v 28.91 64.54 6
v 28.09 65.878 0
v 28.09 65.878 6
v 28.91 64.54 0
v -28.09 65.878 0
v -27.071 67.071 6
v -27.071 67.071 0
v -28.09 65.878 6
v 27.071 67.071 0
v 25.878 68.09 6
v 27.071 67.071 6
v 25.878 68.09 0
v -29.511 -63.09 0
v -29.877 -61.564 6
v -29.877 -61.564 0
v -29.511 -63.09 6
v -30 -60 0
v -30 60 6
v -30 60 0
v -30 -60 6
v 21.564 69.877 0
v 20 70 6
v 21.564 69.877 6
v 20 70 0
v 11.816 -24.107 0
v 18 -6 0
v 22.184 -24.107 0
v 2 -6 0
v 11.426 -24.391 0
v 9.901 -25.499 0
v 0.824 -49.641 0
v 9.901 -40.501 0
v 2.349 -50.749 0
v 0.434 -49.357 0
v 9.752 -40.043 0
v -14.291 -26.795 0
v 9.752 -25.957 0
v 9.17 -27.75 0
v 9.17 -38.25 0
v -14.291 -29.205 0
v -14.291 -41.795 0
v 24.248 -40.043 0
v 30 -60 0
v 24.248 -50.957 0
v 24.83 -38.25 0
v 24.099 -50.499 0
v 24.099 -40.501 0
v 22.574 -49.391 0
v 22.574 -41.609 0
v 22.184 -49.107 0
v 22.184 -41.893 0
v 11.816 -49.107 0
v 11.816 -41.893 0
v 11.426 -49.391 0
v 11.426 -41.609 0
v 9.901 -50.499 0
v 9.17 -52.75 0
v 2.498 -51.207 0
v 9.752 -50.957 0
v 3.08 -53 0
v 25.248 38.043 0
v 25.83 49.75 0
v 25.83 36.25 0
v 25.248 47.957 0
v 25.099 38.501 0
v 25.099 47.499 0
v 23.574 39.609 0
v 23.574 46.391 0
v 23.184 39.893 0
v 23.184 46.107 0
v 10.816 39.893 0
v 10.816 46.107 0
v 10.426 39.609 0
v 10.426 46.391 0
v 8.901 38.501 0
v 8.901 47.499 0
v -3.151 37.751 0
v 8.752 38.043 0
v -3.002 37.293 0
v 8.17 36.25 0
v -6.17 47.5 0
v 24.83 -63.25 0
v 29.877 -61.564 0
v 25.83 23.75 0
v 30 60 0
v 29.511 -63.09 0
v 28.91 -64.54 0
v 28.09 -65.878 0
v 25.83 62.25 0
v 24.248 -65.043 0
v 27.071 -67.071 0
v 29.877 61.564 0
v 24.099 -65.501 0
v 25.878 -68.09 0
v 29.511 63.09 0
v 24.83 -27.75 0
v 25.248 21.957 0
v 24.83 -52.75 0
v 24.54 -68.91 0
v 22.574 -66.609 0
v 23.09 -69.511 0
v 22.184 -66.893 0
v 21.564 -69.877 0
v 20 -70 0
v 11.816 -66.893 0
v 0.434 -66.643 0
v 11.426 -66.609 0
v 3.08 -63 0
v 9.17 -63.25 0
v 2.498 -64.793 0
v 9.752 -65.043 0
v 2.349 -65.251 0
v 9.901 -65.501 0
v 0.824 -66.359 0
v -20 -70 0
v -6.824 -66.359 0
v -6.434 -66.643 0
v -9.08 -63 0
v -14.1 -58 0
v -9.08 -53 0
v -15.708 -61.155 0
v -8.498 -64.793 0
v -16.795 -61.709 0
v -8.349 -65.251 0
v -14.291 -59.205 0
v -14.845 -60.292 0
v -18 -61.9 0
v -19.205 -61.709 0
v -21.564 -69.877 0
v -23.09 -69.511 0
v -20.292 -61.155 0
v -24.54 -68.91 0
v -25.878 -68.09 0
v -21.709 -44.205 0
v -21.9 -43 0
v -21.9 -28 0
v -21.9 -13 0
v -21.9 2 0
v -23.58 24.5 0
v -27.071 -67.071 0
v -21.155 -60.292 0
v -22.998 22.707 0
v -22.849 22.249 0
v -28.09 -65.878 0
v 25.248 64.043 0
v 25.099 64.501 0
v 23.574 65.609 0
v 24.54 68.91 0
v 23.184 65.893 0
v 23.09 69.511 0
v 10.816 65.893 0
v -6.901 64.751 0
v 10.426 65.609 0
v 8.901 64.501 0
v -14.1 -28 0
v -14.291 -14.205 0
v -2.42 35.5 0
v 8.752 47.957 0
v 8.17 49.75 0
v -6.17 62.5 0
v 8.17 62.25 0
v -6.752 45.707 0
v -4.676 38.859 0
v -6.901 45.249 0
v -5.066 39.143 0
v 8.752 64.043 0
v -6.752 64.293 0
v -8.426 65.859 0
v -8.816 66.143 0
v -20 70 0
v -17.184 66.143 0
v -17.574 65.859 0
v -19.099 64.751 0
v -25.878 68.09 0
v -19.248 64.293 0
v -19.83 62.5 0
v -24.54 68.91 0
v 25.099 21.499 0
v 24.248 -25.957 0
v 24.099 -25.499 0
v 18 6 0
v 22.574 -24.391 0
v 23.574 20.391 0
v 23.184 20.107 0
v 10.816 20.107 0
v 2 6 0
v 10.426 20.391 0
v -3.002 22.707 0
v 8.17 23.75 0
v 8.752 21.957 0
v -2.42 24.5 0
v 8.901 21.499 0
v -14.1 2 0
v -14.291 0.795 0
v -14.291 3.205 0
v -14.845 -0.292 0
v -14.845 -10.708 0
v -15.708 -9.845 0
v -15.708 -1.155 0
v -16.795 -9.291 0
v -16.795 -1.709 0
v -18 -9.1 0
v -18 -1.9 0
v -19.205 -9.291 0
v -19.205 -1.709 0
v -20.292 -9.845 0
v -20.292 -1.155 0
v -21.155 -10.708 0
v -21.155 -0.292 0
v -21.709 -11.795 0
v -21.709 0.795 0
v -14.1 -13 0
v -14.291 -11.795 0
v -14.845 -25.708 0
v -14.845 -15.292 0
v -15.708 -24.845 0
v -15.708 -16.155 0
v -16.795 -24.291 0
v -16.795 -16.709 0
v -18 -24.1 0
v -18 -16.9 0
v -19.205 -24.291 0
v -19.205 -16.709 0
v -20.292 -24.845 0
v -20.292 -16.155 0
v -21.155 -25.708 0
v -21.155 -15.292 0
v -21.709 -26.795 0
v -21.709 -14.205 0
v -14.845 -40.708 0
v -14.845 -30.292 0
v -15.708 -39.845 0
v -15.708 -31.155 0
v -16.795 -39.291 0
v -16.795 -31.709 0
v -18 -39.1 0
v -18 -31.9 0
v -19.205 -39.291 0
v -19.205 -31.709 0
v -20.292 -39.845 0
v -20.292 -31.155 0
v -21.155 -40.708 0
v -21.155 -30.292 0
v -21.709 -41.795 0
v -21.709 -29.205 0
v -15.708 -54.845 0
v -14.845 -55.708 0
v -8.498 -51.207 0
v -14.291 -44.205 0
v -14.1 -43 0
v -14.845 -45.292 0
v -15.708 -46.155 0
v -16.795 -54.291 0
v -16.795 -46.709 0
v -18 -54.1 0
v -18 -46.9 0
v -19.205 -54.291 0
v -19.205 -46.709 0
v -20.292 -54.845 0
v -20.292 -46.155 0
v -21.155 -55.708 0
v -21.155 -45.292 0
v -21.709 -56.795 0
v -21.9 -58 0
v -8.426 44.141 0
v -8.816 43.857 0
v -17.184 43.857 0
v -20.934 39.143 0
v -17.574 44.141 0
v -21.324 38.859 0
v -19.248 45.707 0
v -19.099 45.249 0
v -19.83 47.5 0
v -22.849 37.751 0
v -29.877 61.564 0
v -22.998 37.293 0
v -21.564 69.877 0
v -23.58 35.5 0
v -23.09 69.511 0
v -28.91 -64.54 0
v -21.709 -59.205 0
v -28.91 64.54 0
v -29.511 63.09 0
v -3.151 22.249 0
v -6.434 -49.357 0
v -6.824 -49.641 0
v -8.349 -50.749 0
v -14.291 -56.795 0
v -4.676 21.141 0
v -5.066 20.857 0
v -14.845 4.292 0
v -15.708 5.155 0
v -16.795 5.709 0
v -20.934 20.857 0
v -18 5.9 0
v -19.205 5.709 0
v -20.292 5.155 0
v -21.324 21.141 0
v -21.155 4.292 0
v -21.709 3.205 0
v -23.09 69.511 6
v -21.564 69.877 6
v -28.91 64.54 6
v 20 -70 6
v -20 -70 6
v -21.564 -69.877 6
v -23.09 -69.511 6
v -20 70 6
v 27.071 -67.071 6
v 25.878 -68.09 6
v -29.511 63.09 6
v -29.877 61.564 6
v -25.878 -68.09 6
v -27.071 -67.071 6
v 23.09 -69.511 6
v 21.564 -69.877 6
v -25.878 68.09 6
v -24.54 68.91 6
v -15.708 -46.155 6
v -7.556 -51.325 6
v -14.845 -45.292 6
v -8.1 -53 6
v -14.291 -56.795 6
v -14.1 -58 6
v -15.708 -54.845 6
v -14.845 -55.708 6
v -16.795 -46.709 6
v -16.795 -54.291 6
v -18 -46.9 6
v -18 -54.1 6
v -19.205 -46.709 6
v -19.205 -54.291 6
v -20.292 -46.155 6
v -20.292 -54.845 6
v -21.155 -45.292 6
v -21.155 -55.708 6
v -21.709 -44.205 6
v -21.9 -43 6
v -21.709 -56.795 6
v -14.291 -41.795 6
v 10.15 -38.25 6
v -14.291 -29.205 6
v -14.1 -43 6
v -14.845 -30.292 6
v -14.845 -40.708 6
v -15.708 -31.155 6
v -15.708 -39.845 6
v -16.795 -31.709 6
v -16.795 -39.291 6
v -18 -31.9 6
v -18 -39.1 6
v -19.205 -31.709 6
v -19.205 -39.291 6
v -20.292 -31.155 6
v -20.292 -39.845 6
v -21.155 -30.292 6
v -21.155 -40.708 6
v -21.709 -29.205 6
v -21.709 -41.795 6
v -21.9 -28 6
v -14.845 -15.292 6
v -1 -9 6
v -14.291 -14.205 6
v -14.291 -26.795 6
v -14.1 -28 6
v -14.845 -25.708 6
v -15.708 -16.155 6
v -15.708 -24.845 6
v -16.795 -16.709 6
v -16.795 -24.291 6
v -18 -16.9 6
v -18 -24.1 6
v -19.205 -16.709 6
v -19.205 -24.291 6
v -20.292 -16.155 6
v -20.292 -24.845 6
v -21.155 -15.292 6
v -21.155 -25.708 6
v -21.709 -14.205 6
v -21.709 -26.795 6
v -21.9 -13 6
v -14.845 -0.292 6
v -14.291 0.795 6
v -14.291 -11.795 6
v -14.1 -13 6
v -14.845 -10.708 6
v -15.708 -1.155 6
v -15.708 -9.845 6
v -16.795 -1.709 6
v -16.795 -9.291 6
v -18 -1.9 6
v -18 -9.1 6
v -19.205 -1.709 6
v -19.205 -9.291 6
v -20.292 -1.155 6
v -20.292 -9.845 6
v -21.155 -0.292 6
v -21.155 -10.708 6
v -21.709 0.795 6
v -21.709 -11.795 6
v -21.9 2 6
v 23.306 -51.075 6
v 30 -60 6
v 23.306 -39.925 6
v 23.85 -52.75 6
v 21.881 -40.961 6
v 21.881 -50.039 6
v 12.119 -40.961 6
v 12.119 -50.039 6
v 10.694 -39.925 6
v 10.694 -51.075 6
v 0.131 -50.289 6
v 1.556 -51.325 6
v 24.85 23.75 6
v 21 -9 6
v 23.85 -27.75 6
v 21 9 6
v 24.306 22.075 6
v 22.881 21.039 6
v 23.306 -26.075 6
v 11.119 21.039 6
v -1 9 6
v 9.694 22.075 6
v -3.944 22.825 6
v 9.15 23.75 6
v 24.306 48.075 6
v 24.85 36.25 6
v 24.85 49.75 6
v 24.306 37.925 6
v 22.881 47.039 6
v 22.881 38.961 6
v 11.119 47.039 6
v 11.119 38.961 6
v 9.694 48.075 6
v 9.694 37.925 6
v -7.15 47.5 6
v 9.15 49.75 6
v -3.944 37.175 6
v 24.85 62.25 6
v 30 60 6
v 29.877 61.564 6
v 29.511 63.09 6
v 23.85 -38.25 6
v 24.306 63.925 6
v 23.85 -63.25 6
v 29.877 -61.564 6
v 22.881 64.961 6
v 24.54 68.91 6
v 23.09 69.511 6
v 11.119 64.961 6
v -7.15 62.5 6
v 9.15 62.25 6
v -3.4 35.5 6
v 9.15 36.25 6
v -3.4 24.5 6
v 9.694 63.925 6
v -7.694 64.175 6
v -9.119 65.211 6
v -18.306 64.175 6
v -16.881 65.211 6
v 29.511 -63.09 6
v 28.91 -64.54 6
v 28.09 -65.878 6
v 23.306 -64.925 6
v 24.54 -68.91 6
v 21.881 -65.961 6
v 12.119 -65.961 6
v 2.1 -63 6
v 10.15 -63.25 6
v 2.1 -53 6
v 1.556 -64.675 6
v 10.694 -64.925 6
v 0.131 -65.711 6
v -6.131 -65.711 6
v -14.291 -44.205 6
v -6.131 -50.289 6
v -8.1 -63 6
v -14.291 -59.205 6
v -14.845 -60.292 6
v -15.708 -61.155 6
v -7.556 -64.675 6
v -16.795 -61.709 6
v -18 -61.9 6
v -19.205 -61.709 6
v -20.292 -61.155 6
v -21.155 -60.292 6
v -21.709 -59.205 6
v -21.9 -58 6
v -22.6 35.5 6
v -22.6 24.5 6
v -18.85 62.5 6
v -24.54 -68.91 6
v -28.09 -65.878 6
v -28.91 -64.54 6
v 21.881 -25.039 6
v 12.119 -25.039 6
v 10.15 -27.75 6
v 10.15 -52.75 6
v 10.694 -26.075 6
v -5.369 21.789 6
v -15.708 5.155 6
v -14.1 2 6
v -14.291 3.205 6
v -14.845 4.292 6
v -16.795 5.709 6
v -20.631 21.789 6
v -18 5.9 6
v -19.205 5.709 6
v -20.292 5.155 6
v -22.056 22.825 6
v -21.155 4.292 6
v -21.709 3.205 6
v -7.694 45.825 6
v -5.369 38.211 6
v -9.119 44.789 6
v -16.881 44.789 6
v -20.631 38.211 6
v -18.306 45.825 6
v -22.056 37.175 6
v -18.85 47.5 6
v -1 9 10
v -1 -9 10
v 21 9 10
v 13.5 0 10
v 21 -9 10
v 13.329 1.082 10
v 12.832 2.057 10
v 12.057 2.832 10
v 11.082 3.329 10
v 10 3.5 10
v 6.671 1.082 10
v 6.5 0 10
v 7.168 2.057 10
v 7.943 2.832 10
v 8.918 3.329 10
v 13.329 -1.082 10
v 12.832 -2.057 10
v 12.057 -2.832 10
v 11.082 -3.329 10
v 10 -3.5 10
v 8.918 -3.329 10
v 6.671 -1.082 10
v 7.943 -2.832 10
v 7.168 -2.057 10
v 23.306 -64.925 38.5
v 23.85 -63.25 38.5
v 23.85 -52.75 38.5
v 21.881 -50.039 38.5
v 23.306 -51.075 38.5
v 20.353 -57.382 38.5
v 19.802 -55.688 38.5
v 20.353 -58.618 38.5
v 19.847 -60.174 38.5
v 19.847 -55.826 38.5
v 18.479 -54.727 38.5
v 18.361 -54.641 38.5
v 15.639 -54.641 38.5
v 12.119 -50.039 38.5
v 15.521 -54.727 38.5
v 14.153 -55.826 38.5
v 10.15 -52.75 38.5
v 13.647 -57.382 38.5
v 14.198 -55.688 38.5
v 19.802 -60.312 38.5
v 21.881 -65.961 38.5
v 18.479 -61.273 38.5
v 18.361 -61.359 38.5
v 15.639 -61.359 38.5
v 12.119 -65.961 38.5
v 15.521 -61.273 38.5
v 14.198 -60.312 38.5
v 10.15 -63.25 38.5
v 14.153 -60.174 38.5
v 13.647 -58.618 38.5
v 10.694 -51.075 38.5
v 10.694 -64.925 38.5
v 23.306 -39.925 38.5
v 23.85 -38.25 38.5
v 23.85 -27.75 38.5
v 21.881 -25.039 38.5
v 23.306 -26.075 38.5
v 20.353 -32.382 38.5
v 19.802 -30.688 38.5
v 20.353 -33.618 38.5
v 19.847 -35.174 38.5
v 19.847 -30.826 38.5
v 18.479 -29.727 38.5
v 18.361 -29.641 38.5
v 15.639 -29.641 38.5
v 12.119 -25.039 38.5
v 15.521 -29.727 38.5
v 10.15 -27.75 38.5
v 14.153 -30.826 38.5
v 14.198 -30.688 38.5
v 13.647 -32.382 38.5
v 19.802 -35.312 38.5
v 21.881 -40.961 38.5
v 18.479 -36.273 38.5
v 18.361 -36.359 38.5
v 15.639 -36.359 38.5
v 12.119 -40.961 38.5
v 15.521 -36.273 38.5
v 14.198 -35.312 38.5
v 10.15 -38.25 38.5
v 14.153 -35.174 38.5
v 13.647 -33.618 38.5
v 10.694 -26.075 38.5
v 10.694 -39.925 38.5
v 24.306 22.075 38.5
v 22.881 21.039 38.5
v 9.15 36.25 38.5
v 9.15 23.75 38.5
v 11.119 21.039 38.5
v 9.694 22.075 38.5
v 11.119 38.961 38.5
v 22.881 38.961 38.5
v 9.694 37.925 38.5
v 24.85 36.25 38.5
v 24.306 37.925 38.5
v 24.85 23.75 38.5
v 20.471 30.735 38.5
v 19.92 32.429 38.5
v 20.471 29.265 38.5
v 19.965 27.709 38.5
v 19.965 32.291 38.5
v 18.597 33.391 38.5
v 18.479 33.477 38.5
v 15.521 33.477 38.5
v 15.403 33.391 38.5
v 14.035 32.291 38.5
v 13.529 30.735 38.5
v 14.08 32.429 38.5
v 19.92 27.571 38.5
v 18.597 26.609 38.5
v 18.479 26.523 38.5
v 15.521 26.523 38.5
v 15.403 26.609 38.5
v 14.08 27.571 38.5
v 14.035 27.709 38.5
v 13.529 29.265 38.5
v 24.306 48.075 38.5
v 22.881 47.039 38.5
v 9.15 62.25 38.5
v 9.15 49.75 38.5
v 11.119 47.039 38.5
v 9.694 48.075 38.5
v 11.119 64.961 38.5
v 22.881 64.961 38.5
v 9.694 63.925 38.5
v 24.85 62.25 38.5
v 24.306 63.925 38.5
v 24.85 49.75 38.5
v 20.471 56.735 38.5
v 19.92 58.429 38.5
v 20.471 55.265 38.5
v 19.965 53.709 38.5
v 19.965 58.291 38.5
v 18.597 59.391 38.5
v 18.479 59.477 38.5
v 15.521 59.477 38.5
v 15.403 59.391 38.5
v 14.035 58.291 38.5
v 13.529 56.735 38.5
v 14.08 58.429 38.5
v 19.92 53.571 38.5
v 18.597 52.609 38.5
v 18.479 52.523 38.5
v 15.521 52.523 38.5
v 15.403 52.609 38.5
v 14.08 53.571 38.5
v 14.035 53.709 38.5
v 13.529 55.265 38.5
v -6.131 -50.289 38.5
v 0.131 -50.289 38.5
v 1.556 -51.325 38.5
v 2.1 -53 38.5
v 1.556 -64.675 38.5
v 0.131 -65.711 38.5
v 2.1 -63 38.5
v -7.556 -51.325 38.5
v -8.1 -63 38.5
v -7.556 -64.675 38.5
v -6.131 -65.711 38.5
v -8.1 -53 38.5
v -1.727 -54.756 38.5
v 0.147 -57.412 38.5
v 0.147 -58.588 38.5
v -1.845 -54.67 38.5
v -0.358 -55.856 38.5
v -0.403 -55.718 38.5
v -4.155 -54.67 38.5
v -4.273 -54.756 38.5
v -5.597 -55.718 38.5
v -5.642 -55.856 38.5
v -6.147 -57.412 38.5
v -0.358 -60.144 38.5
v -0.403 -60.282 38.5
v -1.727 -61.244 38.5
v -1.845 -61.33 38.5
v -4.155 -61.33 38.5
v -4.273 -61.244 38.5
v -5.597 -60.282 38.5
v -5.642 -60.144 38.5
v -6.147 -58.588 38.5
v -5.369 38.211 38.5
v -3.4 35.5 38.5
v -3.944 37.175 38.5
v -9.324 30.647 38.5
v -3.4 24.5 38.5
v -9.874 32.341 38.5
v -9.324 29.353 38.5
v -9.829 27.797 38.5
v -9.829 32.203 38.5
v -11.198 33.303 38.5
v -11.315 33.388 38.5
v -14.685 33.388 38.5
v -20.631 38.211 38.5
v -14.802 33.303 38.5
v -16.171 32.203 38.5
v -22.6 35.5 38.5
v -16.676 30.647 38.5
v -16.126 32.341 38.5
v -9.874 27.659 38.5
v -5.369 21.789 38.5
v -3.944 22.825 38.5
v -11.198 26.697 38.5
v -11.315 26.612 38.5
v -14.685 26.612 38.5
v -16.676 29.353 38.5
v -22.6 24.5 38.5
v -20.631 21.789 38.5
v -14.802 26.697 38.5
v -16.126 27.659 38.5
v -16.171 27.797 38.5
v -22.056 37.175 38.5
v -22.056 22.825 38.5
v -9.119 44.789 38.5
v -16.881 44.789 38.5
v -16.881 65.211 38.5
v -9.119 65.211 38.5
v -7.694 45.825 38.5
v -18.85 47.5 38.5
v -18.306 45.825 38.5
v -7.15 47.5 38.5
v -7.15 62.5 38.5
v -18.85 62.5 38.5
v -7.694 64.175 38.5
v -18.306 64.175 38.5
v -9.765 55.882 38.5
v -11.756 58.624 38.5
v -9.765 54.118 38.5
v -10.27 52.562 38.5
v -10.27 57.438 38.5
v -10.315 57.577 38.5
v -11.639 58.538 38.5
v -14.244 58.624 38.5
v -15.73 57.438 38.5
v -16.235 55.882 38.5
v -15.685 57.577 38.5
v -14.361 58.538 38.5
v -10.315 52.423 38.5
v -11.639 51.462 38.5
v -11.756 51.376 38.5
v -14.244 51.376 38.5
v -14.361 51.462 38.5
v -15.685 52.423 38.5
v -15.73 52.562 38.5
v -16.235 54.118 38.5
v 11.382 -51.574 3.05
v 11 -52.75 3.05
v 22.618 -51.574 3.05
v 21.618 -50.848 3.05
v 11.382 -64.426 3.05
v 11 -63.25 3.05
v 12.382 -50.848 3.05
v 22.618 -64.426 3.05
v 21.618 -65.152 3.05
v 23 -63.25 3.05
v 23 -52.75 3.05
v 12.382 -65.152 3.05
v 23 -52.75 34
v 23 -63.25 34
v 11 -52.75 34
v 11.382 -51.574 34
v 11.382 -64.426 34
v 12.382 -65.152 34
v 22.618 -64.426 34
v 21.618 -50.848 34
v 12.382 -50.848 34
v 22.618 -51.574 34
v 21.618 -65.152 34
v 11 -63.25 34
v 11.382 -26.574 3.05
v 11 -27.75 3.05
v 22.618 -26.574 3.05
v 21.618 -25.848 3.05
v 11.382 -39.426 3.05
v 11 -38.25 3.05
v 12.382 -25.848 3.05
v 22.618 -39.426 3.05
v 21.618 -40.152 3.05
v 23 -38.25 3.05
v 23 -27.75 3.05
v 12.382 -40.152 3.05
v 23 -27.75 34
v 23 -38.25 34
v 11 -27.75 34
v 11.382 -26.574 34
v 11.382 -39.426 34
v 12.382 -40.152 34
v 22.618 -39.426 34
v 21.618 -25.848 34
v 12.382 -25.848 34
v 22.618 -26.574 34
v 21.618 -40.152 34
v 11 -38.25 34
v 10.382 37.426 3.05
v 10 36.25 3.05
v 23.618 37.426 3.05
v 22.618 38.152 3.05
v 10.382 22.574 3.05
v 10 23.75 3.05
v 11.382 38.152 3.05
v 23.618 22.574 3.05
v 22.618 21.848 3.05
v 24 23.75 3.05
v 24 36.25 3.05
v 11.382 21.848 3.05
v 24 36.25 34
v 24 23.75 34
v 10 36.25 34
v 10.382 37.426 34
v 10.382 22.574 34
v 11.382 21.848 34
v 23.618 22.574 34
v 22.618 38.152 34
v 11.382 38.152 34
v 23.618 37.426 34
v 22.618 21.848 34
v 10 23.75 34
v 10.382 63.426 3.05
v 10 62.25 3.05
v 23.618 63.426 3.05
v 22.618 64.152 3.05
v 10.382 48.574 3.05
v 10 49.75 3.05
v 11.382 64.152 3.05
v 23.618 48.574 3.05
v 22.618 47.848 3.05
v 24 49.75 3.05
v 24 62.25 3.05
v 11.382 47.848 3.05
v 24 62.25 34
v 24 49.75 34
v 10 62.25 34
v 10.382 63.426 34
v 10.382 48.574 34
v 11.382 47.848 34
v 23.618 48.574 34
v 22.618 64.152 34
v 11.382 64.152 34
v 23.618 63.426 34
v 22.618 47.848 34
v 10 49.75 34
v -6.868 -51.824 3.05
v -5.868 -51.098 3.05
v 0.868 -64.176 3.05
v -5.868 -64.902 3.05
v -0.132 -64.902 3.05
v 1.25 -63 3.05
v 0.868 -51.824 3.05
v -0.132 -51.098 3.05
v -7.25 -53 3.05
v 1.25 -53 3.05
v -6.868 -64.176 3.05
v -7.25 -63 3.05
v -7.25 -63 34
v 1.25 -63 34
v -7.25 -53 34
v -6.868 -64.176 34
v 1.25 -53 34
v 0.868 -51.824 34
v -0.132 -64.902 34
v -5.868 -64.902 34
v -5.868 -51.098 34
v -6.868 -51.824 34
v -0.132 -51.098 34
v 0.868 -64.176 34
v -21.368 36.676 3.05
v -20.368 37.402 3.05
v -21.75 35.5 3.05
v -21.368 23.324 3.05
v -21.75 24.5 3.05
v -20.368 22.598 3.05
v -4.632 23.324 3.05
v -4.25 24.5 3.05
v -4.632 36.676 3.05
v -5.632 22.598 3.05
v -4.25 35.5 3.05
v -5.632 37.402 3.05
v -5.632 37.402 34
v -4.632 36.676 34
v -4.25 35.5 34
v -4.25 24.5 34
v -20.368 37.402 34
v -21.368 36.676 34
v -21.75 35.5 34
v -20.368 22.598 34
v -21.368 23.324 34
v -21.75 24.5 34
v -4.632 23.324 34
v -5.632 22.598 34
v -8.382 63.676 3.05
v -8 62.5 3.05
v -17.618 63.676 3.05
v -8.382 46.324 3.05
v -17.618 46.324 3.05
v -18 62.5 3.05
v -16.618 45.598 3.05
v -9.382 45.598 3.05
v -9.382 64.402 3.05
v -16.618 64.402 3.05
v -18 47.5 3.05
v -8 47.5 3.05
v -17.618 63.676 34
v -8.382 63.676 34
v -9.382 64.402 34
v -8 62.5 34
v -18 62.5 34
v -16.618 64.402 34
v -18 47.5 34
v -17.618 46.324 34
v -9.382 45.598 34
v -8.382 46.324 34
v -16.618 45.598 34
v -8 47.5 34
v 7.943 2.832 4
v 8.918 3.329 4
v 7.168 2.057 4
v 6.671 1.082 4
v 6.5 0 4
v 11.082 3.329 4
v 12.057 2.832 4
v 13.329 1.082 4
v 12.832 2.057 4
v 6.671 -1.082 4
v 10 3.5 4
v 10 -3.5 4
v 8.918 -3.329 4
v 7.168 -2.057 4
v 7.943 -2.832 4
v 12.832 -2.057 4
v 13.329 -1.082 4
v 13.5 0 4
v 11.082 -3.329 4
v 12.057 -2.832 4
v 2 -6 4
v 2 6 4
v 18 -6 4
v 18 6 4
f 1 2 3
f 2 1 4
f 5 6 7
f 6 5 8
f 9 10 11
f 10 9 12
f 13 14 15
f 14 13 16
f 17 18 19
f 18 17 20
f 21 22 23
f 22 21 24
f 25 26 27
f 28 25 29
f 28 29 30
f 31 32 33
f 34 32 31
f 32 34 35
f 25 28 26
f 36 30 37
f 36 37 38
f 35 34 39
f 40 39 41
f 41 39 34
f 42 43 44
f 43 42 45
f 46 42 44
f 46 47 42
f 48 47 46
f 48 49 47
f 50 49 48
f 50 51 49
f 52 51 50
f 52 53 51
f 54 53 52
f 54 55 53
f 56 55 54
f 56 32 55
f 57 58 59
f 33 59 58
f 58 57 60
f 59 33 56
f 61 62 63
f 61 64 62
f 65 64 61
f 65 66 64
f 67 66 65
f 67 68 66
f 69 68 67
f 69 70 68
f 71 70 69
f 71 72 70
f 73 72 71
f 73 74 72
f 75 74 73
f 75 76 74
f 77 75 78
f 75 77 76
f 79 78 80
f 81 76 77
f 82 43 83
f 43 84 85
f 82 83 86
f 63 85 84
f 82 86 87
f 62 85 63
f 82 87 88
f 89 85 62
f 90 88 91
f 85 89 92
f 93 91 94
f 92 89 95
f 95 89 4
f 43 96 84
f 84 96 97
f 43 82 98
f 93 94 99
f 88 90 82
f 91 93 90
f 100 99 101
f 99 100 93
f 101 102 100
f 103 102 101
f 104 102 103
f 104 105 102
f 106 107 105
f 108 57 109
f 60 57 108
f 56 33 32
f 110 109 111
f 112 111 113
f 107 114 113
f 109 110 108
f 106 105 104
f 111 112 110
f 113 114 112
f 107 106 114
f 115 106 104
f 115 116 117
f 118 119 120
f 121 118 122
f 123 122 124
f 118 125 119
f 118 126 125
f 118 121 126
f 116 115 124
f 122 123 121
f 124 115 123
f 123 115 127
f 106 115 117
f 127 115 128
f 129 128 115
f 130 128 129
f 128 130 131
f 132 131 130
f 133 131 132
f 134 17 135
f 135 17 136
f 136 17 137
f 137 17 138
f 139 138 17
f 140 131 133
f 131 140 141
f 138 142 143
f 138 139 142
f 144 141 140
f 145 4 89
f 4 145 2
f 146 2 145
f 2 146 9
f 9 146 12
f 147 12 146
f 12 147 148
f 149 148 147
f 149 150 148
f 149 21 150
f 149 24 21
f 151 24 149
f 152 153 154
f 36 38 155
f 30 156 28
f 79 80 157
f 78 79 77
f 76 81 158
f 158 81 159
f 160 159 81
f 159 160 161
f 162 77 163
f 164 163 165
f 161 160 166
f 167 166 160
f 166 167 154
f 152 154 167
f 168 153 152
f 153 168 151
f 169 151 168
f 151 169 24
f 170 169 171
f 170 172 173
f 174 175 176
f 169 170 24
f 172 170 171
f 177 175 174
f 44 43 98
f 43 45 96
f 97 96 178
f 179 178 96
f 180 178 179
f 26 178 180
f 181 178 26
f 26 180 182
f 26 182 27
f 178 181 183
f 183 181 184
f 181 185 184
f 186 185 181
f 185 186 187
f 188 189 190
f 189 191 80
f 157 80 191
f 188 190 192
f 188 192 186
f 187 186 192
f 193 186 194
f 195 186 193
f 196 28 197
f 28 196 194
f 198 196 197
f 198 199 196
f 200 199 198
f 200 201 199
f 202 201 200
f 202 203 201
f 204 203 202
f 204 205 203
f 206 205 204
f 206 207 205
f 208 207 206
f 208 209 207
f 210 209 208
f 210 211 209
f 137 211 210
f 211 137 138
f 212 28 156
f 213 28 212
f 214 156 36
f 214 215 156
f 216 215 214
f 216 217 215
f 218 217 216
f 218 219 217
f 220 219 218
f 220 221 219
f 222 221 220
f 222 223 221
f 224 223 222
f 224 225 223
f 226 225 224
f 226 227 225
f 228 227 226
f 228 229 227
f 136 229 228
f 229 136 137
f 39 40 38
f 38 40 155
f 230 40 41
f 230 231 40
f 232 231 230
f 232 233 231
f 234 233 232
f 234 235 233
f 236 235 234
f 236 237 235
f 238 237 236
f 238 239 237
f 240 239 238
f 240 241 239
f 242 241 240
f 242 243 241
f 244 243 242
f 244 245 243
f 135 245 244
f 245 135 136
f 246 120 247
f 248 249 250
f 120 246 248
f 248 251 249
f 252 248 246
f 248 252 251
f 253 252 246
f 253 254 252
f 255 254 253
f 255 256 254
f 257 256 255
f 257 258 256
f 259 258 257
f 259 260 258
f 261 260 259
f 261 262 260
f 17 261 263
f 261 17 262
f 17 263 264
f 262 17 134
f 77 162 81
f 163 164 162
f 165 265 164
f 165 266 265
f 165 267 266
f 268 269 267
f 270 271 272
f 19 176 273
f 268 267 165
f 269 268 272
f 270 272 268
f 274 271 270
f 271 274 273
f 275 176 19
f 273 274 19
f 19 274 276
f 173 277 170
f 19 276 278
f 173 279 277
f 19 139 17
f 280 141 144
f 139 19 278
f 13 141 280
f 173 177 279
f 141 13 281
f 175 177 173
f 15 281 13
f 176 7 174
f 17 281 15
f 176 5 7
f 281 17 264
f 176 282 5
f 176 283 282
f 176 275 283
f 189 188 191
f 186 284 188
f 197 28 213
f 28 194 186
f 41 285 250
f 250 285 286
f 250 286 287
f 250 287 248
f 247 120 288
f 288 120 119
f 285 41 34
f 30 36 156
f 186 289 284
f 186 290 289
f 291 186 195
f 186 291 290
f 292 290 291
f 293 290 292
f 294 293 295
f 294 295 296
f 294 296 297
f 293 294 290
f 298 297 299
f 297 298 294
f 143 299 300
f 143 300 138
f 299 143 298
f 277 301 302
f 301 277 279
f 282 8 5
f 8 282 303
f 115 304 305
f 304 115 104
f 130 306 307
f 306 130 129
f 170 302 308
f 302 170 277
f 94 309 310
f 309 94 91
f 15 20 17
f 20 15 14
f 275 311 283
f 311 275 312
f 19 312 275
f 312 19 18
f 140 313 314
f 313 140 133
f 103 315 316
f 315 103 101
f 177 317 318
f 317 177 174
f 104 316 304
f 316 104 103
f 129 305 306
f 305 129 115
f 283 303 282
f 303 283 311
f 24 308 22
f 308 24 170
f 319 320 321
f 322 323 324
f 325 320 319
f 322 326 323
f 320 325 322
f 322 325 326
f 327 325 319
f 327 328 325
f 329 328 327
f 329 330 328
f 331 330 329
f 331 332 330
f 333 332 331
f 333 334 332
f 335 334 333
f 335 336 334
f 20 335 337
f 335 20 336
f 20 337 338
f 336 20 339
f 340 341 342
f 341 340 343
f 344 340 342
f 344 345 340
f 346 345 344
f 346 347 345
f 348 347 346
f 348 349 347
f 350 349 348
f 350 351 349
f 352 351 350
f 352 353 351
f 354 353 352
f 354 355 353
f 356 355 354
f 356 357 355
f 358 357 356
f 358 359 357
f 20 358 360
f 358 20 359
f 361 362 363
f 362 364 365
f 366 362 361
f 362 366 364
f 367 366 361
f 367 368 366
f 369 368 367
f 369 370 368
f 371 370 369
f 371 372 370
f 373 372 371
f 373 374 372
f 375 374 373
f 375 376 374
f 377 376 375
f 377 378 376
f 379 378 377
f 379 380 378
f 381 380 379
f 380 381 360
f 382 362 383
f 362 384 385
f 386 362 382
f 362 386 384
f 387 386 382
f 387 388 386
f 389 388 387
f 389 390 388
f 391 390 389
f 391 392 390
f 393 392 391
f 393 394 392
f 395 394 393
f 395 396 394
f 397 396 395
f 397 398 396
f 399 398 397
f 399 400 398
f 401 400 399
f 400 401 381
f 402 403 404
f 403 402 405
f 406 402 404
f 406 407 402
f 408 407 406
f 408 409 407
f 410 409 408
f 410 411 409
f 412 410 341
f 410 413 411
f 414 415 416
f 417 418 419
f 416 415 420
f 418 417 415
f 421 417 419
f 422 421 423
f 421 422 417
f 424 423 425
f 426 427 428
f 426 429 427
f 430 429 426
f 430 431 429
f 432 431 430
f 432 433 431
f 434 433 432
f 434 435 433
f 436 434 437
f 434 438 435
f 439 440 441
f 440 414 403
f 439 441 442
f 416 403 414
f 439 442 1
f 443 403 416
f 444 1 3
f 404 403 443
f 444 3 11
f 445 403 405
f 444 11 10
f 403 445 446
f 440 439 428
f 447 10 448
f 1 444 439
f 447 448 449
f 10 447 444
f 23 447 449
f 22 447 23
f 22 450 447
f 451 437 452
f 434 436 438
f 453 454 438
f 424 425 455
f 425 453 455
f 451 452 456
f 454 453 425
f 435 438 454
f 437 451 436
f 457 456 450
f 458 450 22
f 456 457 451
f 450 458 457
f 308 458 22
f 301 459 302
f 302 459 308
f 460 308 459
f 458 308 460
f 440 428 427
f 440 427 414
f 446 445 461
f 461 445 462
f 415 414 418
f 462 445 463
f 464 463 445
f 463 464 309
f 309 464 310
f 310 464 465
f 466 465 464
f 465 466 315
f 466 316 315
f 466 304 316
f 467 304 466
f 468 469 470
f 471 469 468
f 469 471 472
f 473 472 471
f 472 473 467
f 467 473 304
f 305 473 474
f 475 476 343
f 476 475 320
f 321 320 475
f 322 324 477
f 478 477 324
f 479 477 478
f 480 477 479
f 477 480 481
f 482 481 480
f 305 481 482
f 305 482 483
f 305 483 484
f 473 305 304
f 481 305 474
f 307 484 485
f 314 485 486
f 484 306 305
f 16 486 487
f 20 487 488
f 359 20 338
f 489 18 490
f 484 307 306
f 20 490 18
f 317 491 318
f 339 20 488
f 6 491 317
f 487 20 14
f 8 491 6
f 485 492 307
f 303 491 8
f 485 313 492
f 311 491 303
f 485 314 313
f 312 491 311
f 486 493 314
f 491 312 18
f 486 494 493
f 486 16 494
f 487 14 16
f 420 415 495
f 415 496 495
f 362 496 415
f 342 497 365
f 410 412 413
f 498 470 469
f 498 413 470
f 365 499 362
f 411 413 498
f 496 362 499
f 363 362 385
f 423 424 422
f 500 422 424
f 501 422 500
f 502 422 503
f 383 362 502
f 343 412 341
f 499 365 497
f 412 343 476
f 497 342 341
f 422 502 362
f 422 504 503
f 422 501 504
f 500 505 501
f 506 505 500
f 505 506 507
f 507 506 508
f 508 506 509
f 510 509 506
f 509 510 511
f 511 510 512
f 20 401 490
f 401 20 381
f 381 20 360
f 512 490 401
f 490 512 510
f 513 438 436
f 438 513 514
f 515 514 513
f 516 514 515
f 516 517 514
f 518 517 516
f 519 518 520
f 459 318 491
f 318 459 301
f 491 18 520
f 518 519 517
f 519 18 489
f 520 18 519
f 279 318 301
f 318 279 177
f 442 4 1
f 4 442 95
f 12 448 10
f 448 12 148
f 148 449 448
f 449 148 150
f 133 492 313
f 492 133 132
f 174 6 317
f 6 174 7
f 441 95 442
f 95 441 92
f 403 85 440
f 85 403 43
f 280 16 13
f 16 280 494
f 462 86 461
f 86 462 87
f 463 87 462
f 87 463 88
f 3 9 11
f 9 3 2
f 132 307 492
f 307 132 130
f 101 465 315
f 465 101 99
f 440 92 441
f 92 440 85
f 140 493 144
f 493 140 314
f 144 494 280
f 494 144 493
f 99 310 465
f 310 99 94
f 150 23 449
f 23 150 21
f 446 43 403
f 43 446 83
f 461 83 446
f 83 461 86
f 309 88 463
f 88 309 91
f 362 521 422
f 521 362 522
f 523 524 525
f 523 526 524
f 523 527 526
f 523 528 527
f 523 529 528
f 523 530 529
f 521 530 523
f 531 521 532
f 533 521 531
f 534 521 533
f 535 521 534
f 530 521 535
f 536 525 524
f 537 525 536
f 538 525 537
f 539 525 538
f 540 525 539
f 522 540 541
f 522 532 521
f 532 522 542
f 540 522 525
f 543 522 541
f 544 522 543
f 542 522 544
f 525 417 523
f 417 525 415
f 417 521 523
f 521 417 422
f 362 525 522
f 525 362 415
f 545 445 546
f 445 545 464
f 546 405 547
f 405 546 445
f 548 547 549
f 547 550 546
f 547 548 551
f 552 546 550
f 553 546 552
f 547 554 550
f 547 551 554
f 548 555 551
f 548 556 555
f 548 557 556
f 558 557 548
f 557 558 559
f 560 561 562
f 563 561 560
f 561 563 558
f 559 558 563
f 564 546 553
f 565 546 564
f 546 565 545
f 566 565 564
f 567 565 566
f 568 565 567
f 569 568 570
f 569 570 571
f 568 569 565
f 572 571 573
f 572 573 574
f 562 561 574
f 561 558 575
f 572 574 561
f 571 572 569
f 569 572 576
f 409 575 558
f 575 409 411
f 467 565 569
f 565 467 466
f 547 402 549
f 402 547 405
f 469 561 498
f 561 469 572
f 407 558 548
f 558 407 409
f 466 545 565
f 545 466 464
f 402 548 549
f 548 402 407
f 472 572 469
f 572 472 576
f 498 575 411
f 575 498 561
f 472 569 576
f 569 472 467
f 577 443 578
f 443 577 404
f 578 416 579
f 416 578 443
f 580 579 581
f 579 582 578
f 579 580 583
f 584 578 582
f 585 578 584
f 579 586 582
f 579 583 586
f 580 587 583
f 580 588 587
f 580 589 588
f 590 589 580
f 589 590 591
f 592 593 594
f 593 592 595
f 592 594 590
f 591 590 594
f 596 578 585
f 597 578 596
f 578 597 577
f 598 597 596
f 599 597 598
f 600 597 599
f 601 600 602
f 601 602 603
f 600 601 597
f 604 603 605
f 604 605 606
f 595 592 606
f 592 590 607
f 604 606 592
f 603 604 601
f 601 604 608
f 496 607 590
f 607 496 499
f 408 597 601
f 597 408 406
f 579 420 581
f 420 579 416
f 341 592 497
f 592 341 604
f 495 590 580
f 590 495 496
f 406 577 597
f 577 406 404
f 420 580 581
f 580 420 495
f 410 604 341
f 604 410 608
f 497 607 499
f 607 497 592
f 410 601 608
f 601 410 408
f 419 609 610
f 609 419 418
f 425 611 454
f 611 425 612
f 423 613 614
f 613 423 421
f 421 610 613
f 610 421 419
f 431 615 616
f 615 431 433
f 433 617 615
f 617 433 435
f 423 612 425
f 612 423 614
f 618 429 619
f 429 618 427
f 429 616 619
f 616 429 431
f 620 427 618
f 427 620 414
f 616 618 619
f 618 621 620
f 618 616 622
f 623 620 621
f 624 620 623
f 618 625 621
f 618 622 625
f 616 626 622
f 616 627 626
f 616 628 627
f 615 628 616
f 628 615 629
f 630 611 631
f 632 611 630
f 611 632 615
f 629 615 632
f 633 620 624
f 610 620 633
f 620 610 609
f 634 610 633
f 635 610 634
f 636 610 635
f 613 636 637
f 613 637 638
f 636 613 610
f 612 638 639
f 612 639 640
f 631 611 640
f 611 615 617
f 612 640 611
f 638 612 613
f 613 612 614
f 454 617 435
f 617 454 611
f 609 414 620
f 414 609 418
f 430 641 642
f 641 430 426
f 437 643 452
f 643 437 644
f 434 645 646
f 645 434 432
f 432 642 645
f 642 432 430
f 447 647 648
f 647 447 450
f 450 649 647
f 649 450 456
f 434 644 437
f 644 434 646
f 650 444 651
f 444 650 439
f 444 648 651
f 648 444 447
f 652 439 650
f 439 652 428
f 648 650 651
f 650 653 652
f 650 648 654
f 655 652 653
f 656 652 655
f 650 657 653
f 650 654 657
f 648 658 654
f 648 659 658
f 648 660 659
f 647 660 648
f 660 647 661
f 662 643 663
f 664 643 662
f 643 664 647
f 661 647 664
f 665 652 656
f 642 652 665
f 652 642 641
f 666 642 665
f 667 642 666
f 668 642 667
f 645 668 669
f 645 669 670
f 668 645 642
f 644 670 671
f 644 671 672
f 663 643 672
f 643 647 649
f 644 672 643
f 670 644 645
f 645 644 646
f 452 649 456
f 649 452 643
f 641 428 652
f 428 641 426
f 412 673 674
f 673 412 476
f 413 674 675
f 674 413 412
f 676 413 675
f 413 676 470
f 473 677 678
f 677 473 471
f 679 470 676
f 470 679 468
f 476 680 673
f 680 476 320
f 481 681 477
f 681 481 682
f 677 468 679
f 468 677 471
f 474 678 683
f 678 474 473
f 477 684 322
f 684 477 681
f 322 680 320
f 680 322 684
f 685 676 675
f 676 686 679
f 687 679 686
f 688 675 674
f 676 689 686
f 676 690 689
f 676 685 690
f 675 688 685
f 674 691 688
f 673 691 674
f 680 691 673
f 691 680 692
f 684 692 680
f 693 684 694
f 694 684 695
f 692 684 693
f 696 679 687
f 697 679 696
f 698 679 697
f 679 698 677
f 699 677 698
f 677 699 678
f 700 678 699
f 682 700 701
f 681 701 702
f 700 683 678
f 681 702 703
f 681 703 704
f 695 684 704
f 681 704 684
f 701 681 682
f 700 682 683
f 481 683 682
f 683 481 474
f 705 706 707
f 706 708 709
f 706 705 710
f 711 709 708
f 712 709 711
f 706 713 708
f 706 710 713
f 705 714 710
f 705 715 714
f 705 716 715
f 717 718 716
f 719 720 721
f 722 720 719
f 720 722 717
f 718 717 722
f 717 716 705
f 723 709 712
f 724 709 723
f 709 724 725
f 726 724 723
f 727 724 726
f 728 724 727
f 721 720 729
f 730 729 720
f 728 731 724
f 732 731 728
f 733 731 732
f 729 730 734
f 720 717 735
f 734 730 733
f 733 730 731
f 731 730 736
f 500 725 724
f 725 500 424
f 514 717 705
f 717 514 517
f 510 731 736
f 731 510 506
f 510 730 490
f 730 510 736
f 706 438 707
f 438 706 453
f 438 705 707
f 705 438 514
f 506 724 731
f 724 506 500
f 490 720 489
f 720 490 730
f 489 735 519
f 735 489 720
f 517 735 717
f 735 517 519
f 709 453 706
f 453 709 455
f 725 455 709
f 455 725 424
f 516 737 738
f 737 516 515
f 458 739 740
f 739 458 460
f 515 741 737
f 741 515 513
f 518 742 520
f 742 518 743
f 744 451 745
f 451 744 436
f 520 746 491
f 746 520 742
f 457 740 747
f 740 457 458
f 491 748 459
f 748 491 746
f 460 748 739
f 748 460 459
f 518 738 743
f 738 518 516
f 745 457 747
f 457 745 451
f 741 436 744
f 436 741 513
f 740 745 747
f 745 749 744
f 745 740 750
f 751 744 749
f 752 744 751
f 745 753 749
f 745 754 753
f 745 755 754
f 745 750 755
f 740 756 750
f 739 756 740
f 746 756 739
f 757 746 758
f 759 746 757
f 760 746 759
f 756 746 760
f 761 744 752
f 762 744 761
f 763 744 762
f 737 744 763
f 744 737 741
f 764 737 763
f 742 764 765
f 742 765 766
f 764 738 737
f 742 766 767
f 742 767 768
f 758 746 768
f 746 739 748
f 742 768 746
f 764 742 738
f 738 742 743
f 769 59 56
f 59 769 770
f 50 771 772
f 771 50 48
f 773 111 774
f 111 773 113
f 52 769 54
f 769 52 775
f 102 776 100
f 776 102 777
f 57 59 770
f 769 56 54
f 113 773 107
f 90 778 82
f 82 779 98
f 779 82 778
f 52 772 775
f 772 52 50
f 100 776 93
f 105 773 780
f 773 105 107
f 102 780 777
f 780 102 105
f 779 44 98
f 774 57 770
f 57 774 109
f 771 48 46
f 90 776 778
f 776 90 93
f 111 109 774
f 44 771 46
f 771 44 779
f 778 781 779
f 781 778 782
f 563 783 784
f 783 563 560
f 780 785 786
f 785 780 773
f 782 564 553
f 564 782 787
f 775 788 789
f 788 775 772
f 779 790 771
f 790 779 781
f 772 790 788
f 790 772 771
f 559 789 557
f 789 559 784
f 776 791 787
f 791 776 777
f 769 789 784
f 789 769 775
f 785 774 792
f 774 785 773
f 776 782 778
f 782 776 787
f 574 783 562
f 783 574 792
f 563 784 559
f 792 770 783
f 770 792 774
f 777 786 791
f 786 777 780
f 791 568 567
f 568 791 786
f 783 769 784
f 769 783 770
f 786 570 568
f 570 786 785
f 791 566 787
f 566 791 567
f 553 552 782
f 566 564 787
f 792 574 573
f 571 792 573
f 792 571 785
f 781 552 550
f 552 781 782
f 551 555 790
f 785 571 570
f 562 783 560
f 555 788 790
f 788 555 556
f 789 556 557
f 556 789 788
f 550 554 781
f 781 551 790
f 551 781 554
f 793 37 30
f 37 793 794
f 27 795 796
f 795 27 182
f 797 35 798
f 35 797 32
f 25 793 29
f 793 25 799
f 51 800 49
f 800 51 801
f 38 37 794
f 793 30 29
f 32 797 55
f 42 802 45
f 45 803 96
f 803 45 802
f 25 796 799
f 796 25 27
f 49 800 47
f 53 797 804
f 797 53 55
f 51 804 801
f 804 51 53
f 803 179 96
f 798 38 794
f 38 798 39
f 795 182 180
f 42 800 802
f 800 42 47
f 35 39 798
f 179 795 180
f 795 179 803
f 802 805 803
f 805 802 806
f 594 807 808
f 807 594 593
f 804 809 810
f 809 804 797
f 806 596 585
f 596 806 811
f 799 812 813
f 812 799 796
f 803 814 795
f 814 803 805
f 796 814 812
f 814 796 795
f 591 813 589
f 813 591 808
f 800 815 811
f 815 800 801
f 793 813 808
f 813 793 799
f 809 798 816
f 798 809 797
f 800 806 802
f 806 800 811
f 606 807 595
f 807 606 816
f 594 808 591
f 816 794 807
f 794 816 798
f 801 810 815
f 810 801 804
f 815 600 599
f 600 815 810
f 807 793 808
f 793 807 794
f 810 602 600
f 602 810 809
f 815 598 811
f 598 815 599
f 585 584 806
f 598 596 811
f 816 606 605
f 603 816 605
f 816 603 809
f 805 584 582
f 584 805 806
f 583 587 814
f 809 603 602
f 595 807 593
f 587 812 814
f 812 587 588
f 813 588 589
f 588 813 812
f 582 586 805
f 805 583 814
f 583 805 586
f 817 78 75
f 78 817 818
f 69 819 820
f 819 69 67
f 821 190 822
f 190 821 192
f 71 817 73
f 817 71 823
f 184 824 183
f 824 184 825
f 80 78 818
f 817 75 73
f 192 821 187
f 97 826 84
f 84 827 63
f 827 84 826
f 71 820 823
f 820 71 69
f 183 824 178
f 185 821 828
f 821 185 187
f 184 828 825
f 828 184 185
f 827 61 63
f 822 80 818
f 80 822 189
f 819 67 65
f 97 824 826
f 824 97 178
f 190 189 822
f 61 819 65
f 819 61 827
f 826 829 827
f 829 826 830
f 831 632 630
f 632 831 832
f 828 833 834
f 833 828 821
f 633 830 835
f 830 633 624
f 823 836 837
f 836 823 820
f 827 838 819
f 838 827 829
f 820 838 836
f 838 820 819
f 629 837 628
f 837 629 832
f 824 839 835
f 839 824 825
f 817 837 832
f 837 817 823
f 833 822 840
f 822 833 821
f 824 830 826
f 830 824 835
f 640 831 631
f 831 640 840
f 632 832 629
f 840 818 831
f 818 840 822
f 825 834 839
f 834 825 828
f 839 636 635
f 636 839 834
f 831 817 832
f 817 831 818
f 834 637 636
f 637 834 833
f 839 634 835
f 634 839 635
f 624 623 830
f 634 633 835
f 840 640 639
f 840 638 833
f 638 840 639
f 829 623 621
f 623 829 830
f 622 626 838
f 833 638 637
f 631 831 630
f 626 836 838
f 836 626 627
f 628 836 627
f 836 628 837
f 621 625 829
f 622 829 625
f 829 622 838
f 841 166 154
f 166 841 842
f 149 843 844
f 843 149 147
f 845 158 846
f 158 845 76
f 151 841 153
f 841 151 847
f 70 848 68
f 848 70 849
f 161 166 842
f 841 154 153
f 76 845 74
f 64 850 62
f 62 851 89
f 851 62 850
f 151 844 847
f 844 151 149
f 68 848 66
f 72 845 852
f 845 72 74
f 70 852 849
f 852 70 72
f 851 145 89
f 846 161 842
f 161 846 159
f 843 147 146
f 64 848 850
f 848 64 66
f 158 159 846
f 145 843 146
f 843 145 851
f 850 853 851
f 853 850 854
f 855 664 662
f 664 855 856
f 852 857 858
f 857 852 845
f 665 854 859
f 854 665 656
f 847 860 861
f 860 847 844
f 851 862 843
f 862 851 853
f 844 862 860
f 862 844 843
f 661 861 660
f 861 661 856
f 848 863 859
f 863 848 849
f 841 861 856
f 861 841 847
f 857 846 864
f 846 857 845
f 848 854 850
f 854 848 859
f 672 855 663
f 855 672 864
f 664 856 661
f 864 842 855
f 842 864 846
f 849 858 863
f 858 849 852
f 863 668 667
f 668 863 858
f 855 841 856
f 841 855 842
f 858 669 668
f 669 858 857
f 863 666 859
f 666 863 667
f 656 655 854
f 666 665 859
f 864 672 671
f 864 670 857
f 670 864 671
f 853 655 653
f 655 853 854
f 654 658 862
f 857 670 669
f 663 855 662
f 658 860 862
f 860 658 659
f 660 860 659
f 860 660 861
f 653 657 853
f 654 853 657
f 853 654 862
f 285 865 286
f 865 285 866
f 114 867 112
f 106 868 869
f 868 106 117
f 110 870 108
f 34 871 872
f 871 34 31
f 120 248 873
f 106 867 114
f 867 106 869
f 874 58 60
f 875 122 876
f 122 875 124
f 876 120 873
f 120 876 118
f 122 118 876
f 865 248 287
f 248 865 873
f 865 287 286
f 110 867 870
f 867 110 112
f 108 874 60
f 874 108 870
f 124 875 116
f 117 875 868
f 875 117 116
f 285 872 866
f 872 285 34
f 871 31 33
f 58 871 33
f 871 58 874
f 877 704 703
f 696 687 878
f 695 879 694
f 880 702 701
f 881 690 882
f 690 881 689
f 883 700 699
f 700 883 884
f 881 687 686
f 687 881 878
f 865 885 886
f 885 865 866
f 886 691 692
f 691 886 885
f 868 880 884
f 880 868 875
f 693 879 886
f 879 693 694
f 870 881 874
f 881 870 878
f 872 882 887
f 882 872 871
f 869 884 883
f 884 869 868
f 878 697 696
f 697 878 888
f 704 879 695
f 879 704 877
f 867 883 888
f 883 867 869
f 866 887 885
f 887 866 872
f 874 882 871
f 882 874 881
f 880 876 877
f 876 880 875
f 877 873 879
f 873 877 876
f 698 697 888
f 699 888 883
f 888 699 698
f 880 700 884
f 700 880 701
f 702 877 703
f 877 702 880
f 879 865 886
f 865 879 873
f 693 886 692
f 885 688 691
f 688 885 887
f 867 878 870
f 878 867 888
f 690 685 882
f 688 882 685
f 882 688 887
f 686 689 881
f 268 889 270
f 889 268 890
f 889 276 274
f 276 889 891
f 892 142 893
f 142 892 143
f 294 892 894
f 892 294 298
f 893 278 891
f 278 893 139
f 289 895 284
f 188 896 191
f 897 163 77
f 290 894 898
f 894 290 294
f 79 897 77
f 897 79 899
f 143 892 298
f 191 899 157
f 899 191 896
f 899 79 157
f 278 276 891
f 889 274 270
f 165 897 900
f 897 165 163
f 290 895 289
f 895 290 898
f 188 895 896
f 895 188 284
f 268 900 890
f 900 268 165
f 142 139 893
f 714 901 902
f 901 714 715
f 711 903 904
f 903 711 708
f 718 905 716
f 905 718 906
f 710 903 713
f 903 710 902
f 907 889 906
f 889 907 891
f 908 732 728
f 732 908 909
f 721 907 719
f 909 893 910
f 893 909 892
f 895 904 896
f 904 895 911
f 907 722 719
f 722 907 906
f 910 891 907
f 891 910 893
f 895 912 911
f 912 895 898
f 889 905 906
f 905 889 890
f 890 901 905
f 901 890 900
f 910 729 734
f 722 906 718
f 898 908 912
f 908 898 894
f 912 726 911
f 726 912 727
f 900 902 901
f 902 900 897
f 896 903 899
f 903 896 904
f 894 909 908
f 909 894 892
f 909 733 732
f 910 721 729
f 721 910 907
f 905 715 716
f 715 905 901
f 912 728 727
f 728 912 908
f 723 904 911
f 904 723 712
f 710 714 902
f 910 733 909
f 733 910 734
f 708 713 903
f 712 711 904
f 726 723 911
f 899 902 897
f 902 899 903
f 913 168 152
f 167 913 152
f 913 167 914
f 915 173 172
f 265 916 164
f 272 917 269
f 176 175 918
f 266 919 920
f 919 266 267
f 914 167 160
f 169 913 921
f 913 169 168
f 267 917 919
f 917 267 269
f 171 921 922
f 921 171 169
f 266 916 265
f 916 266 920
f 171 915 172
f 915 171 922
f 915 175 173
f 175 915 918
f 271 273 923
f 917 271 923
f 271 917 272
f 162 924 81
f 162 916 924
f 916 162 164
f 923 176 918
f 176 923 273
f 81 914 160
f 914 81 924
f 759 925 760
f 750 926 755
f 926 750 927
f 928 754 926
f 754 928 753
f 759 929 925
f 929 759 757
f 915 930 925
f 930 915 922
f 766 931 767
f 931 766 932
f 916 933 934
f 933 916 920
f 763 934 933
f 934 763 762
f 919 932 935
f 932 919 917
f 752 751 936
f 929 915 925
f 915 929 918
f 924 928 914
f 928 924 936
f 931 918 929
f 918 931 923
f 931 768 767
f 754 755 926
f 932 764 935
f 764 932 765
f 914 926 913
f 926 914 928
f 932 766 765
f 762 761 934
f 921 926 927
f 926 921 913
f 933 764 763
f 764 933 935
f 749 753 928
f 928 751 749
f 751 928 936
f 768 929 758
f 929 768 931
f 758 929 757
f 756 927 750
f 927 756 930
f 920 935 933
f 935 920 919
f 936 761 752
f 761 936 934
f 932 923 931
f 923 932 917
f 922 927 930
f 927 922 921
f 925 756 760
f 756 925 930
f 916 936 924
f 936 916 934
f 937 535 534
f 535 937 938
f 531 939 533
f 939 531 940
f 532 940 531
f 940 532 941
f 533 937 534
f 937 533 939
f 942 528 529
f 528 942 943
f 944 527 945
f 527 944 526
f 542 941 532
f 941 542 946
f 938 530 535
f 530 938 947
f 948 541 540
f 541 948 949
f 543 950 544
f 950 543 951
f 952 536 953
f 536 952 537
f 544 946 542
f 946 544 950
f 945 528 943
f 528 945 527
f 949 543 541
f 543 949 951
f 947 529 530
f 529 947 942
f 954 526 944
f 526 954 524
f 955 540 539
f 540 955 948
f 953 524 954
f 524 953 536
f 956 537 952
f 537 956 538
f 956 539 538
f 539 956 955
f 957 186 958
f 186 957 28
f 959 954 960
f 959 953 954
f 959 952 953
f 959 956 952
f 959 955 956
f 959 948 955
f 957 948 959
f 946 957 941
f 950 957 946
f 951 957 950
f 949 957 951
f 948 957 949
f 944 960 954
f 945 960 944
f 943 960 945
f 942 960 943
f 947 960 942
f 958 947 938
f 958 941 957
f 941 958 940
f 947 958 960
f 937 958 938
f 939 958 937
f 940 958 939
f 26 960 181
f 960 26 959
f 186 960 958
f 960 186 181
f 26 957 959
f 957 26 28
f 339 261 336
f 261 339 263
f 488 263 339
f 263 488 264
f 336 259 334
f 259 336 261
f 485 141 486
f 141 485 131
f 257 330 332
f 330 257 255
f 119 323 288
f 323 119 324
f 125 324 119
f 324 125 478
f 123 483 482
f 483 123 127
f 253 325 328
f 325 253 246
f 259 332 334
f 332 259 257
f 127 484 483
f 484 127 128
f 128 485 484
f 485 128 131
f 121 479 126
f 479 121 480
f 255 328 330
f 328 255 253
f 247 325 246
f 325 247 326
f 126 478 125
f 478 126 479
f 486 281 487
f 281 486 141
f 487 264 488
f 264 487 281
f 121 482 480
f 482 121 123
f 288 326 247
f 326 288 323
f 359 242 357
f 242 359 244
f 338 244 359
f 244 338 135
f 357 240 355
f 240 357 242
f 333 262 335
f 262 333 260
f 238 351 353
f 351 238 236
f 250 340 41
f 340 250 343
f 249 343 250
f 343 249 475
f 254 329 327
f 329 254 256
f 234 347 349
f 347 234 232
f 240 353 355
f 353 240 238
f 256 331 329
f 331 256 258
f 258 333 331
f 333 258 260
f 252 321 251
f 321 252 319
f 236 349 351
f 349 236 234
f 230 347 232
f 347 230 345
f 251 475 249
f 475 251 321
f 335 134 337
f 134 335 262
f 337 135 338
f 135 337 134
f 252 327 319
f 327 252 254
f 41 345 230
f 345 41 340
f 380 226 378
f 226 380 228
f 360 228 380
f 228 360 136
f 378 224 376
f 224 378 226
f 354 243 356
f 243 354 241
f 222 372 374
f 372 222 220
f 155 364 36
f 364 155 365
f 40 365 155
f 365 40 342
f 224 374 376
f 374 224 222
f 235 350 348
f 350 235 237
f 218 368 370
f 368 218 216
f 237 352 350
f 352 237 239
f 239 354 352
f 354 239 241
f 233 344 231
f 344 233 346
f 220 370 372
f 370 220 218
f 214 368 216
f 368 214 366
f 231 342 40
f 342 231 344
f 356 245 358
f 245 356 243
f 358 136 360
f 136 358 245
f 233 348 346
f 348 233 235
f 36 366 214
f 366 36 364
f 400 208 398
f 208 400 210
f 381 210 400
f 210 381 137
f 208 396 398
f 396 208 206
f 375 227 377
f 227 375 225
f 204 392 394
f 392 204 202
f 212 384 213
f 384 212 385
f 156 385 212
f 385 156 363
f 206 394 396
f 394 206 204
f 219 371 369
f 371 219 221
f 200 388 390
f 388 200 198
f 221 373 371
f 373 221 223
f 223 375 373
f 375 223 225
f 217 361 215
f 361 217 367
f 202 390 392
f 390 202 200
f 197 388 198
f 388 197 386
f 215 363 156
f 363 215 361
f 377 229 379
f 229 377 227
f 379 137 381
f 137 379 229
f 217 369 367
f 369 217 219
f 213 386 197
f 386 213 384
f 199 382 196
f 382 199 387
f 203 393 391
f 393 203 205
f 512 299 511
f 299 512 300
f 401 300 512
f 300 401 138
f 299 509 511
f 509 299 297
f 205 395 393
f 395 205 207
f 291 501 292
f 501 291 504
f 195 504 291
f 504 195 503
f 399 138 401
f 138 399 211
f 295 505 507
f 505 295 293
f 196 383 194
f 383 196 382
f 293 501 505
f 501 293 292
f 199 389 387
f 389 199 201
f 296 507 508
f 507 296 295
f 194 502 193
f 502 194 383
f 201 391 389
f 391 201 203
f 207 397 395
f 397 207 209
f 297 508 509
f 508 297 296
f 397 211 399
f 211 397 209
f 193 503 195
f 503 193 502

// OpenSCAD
R=10;
H=6;
sx=40;
sy=140;

w=1.7;

module holder_hole(x, y, r) {
  hull() {        
    translate([-(x/2-r), -(y/2-r), (30+H)/2-5])
      cylinder(h=0.1, r1=r, r2=r, center=true, $fn=10);  
    translate([-(x/2-r), +(y/2-r), (30+H)/2-5])
      cylinder(h=0.1, r1=r, r2=r, center=true, $fn=10);  
    translate([+(x/2-r), +(y/2-r), (30+H)/2-5])
      cylinder(h=0.1, r1=r, r2=r, center=true, $fn=10);  
    translate([+(x/2-r), -(y/2-r), (30+H)/2-5])
      cylinder(h=0.1, r1=r, r2=r, center=true, $fn=10);  

    translate([-(x/2-r), -(y/2-r), (30+H)/2])
      cylinder(h=0.1, r1=r+3, r2=r+3, center=true, $fn=10);  
    translate([-(x/2-r), +(y/2-r), (30+H)/2])
      cylinder(h=0.1, r1=r+3, r2=r+3, center=true, $fn=10);  
    translate([+(x/2-r), +(y/2-r), (30+H)/2])
      cylinder(h=0.1, r1=r+3, r2=r+3, center=true, $fn=10);  
    translate([+(x/2-r), -(y/2-r), (30+H)/2])
      cylinder(h=0.1, r1=r+3, r2=r+3, center=true, $fn=10);  

  }

  hull() {        
    translate([-(x/2-r), -(y/2-r), 0])
      cylinder(h=30+H, r1=r, r2=r, center=true, $fn=10);  
    translate([-(x/2-r), +(y/2-r), 0])
      cylinder(h=30+H, r1=r, r2=r, center=true, $fn=10);  
    translate([+(x/2-r), +(y/2-r), 0])
      cylinder(h=30+H, r1=r, r2=r, center=true, $fn=10);  
    translate([+(x/2-r), -(y/2-r), 0])
      cylinder(h=30+H, r1=r, r2=r, center=true, $fn=10);  
    translate([0, 0, -23])
      cylinder(h=0.2, r1=3, r2=3, center=true, $fn=10);  
  }
//  cylinder(h=80, r1=3, r2=3, center=true, $fn=10);  
}

module holder_hull(x, y, r) {
  x = x + w;
  y = y + w;
  r = r + w/2;
  hull() {
    translate([-(x/2-r), -(y/2-r), 0])
      cylinder(h=35, r1=r, r2=r, center=true, $fn=10);  
    translate([-(x/2-r), +(y/2-r), 0])
      cylinder(h=35, r1=r, r2=r, center=true, $fn=10);  
    translate([+(x/2-r), +(y/2-r), 0])
      cylinder(h=35, r1=r, r2=r, center=true, $fn=10);  
    translate([+(x/2-r), -(y/2-r), 0])
      cylinder(h=35, r1=r, r2=r, center=true, $fn=10);  
    
  }
}


module holder() {
  difference() {
    union() {
      hull() {
        translate([+sx/2, +(sy-R*2)/2, 0])
          cylinder(h=H, r1=R, r2=R, center=true, $fn=40);
        translate([+sx/2, -(sy-R*2)/2, 0])
          cylinder(h=H, r1=R, r2=R, center=true, $fn=40);  
        translate([-sx/2, +(sy-R*2)/2, 0])
          cylinder(h=H, r1=R, r2=R, center=true, $fn=40);
        translate([-sx/2, -(sy-R*2)/2, 0])
          cylinder(h=H, r1=R, r2=R, center=true, $fn=40);  
      }
      
      translate([-sx/2+10, 0, -4])
        cube([16+6, 12+6, H], center=true);  
      
      
      translate([-17, -58, -30/2-H/2])
        holder_hull(12, 14.5, 2);
      translate([-17, -58+25, -30/2-H/2])
        holder_hull(12, 14.5, 2);

      translate([-17, -70+100, -30/2-H/2])
        holder_hull(14, 16.5, 2);
      translate([-17, -70+100+26, -30/2-H/2])
        holder_hull(14, 16.5, 2);
      
      translate([-17+20, -58, -30/2-H/2])
        holder_hull(8.5, 14, 2);
      

      translate([-17+30, -70+100, -30/2-H/2])
        holder_hull(17.5, 15, 2);
      translate([-17+30, -70+100+25, -30/2-H/2])
        holder_hull(10, 19, 2);    
    }
    
    union() {
      translate([-sx/2+10, 0, 0])
        cylinder(h=H+20, r1=7/2, r2=7/2, center=true, $fn=20);  
      translate([-sx/2+10, 0, H-4])
        cube([16, 12, H], center=true);  
      
      translate([-17, -58, -(30+H)/2+H/2+2])
        holder_hole(12, 14.5, 2);    
      translate([-17, -58+25, -(30+H)/2+H/2+2])
        holder_hole(12, 14.5, 2);    

      translate([-17, -70+100, -(30+H)/2+H/2+2])
        holder_hole(14, 16.5, 2);    
      translate([-17, -70+100+26, -(30+H)/2+H/2+2])
        holder_hole(14, 16.5, 2);    
      
      translate([-17+20, -58, -(30+H)/2+H/2+2])
        holder_hole(8.5, 14, 2);

      translate([-17+30, -70+100, -(30+H)/2+H/2+2])
        holder_hole(17.5, 15, 2);    
      translate([-17+30, -70+100+25, -(30+H)/2+H/2+2])
        holder_hole(10, 19, 2);    

      translate([-17+35, -58, 0])
        cylinder(h=H+5, r1=7.8/2, r2=7.8/2, center=true, $fn=20);  

      translate([-17+35, -58+15, 0])
        cylinder(h=H+5, r1=7.8/2, r2=7.8/2, center=true, $fn=20);  

      translate([-17+35, -58+15*2, 0])
        cylinder(h=H+5, r1=7.8/2, r2=7.8/2, center=true, $fn=20);  

      translate([-17+35, -58+15*3, 0])
        cylinder(h=H+5, r1=7.8/2, r2=7.8/2, center=true, $fn=20);  

      translate([-17+35, -58+15*4, 0])
        cylinder(h=H+5, r1=7.8/2, r2=7.8/2, center=true, $fn=20);  
     
    }
  }
}


translate([0, 0, H/2])
  rotate([0, 180, 0]) {  
    holder();
  }
